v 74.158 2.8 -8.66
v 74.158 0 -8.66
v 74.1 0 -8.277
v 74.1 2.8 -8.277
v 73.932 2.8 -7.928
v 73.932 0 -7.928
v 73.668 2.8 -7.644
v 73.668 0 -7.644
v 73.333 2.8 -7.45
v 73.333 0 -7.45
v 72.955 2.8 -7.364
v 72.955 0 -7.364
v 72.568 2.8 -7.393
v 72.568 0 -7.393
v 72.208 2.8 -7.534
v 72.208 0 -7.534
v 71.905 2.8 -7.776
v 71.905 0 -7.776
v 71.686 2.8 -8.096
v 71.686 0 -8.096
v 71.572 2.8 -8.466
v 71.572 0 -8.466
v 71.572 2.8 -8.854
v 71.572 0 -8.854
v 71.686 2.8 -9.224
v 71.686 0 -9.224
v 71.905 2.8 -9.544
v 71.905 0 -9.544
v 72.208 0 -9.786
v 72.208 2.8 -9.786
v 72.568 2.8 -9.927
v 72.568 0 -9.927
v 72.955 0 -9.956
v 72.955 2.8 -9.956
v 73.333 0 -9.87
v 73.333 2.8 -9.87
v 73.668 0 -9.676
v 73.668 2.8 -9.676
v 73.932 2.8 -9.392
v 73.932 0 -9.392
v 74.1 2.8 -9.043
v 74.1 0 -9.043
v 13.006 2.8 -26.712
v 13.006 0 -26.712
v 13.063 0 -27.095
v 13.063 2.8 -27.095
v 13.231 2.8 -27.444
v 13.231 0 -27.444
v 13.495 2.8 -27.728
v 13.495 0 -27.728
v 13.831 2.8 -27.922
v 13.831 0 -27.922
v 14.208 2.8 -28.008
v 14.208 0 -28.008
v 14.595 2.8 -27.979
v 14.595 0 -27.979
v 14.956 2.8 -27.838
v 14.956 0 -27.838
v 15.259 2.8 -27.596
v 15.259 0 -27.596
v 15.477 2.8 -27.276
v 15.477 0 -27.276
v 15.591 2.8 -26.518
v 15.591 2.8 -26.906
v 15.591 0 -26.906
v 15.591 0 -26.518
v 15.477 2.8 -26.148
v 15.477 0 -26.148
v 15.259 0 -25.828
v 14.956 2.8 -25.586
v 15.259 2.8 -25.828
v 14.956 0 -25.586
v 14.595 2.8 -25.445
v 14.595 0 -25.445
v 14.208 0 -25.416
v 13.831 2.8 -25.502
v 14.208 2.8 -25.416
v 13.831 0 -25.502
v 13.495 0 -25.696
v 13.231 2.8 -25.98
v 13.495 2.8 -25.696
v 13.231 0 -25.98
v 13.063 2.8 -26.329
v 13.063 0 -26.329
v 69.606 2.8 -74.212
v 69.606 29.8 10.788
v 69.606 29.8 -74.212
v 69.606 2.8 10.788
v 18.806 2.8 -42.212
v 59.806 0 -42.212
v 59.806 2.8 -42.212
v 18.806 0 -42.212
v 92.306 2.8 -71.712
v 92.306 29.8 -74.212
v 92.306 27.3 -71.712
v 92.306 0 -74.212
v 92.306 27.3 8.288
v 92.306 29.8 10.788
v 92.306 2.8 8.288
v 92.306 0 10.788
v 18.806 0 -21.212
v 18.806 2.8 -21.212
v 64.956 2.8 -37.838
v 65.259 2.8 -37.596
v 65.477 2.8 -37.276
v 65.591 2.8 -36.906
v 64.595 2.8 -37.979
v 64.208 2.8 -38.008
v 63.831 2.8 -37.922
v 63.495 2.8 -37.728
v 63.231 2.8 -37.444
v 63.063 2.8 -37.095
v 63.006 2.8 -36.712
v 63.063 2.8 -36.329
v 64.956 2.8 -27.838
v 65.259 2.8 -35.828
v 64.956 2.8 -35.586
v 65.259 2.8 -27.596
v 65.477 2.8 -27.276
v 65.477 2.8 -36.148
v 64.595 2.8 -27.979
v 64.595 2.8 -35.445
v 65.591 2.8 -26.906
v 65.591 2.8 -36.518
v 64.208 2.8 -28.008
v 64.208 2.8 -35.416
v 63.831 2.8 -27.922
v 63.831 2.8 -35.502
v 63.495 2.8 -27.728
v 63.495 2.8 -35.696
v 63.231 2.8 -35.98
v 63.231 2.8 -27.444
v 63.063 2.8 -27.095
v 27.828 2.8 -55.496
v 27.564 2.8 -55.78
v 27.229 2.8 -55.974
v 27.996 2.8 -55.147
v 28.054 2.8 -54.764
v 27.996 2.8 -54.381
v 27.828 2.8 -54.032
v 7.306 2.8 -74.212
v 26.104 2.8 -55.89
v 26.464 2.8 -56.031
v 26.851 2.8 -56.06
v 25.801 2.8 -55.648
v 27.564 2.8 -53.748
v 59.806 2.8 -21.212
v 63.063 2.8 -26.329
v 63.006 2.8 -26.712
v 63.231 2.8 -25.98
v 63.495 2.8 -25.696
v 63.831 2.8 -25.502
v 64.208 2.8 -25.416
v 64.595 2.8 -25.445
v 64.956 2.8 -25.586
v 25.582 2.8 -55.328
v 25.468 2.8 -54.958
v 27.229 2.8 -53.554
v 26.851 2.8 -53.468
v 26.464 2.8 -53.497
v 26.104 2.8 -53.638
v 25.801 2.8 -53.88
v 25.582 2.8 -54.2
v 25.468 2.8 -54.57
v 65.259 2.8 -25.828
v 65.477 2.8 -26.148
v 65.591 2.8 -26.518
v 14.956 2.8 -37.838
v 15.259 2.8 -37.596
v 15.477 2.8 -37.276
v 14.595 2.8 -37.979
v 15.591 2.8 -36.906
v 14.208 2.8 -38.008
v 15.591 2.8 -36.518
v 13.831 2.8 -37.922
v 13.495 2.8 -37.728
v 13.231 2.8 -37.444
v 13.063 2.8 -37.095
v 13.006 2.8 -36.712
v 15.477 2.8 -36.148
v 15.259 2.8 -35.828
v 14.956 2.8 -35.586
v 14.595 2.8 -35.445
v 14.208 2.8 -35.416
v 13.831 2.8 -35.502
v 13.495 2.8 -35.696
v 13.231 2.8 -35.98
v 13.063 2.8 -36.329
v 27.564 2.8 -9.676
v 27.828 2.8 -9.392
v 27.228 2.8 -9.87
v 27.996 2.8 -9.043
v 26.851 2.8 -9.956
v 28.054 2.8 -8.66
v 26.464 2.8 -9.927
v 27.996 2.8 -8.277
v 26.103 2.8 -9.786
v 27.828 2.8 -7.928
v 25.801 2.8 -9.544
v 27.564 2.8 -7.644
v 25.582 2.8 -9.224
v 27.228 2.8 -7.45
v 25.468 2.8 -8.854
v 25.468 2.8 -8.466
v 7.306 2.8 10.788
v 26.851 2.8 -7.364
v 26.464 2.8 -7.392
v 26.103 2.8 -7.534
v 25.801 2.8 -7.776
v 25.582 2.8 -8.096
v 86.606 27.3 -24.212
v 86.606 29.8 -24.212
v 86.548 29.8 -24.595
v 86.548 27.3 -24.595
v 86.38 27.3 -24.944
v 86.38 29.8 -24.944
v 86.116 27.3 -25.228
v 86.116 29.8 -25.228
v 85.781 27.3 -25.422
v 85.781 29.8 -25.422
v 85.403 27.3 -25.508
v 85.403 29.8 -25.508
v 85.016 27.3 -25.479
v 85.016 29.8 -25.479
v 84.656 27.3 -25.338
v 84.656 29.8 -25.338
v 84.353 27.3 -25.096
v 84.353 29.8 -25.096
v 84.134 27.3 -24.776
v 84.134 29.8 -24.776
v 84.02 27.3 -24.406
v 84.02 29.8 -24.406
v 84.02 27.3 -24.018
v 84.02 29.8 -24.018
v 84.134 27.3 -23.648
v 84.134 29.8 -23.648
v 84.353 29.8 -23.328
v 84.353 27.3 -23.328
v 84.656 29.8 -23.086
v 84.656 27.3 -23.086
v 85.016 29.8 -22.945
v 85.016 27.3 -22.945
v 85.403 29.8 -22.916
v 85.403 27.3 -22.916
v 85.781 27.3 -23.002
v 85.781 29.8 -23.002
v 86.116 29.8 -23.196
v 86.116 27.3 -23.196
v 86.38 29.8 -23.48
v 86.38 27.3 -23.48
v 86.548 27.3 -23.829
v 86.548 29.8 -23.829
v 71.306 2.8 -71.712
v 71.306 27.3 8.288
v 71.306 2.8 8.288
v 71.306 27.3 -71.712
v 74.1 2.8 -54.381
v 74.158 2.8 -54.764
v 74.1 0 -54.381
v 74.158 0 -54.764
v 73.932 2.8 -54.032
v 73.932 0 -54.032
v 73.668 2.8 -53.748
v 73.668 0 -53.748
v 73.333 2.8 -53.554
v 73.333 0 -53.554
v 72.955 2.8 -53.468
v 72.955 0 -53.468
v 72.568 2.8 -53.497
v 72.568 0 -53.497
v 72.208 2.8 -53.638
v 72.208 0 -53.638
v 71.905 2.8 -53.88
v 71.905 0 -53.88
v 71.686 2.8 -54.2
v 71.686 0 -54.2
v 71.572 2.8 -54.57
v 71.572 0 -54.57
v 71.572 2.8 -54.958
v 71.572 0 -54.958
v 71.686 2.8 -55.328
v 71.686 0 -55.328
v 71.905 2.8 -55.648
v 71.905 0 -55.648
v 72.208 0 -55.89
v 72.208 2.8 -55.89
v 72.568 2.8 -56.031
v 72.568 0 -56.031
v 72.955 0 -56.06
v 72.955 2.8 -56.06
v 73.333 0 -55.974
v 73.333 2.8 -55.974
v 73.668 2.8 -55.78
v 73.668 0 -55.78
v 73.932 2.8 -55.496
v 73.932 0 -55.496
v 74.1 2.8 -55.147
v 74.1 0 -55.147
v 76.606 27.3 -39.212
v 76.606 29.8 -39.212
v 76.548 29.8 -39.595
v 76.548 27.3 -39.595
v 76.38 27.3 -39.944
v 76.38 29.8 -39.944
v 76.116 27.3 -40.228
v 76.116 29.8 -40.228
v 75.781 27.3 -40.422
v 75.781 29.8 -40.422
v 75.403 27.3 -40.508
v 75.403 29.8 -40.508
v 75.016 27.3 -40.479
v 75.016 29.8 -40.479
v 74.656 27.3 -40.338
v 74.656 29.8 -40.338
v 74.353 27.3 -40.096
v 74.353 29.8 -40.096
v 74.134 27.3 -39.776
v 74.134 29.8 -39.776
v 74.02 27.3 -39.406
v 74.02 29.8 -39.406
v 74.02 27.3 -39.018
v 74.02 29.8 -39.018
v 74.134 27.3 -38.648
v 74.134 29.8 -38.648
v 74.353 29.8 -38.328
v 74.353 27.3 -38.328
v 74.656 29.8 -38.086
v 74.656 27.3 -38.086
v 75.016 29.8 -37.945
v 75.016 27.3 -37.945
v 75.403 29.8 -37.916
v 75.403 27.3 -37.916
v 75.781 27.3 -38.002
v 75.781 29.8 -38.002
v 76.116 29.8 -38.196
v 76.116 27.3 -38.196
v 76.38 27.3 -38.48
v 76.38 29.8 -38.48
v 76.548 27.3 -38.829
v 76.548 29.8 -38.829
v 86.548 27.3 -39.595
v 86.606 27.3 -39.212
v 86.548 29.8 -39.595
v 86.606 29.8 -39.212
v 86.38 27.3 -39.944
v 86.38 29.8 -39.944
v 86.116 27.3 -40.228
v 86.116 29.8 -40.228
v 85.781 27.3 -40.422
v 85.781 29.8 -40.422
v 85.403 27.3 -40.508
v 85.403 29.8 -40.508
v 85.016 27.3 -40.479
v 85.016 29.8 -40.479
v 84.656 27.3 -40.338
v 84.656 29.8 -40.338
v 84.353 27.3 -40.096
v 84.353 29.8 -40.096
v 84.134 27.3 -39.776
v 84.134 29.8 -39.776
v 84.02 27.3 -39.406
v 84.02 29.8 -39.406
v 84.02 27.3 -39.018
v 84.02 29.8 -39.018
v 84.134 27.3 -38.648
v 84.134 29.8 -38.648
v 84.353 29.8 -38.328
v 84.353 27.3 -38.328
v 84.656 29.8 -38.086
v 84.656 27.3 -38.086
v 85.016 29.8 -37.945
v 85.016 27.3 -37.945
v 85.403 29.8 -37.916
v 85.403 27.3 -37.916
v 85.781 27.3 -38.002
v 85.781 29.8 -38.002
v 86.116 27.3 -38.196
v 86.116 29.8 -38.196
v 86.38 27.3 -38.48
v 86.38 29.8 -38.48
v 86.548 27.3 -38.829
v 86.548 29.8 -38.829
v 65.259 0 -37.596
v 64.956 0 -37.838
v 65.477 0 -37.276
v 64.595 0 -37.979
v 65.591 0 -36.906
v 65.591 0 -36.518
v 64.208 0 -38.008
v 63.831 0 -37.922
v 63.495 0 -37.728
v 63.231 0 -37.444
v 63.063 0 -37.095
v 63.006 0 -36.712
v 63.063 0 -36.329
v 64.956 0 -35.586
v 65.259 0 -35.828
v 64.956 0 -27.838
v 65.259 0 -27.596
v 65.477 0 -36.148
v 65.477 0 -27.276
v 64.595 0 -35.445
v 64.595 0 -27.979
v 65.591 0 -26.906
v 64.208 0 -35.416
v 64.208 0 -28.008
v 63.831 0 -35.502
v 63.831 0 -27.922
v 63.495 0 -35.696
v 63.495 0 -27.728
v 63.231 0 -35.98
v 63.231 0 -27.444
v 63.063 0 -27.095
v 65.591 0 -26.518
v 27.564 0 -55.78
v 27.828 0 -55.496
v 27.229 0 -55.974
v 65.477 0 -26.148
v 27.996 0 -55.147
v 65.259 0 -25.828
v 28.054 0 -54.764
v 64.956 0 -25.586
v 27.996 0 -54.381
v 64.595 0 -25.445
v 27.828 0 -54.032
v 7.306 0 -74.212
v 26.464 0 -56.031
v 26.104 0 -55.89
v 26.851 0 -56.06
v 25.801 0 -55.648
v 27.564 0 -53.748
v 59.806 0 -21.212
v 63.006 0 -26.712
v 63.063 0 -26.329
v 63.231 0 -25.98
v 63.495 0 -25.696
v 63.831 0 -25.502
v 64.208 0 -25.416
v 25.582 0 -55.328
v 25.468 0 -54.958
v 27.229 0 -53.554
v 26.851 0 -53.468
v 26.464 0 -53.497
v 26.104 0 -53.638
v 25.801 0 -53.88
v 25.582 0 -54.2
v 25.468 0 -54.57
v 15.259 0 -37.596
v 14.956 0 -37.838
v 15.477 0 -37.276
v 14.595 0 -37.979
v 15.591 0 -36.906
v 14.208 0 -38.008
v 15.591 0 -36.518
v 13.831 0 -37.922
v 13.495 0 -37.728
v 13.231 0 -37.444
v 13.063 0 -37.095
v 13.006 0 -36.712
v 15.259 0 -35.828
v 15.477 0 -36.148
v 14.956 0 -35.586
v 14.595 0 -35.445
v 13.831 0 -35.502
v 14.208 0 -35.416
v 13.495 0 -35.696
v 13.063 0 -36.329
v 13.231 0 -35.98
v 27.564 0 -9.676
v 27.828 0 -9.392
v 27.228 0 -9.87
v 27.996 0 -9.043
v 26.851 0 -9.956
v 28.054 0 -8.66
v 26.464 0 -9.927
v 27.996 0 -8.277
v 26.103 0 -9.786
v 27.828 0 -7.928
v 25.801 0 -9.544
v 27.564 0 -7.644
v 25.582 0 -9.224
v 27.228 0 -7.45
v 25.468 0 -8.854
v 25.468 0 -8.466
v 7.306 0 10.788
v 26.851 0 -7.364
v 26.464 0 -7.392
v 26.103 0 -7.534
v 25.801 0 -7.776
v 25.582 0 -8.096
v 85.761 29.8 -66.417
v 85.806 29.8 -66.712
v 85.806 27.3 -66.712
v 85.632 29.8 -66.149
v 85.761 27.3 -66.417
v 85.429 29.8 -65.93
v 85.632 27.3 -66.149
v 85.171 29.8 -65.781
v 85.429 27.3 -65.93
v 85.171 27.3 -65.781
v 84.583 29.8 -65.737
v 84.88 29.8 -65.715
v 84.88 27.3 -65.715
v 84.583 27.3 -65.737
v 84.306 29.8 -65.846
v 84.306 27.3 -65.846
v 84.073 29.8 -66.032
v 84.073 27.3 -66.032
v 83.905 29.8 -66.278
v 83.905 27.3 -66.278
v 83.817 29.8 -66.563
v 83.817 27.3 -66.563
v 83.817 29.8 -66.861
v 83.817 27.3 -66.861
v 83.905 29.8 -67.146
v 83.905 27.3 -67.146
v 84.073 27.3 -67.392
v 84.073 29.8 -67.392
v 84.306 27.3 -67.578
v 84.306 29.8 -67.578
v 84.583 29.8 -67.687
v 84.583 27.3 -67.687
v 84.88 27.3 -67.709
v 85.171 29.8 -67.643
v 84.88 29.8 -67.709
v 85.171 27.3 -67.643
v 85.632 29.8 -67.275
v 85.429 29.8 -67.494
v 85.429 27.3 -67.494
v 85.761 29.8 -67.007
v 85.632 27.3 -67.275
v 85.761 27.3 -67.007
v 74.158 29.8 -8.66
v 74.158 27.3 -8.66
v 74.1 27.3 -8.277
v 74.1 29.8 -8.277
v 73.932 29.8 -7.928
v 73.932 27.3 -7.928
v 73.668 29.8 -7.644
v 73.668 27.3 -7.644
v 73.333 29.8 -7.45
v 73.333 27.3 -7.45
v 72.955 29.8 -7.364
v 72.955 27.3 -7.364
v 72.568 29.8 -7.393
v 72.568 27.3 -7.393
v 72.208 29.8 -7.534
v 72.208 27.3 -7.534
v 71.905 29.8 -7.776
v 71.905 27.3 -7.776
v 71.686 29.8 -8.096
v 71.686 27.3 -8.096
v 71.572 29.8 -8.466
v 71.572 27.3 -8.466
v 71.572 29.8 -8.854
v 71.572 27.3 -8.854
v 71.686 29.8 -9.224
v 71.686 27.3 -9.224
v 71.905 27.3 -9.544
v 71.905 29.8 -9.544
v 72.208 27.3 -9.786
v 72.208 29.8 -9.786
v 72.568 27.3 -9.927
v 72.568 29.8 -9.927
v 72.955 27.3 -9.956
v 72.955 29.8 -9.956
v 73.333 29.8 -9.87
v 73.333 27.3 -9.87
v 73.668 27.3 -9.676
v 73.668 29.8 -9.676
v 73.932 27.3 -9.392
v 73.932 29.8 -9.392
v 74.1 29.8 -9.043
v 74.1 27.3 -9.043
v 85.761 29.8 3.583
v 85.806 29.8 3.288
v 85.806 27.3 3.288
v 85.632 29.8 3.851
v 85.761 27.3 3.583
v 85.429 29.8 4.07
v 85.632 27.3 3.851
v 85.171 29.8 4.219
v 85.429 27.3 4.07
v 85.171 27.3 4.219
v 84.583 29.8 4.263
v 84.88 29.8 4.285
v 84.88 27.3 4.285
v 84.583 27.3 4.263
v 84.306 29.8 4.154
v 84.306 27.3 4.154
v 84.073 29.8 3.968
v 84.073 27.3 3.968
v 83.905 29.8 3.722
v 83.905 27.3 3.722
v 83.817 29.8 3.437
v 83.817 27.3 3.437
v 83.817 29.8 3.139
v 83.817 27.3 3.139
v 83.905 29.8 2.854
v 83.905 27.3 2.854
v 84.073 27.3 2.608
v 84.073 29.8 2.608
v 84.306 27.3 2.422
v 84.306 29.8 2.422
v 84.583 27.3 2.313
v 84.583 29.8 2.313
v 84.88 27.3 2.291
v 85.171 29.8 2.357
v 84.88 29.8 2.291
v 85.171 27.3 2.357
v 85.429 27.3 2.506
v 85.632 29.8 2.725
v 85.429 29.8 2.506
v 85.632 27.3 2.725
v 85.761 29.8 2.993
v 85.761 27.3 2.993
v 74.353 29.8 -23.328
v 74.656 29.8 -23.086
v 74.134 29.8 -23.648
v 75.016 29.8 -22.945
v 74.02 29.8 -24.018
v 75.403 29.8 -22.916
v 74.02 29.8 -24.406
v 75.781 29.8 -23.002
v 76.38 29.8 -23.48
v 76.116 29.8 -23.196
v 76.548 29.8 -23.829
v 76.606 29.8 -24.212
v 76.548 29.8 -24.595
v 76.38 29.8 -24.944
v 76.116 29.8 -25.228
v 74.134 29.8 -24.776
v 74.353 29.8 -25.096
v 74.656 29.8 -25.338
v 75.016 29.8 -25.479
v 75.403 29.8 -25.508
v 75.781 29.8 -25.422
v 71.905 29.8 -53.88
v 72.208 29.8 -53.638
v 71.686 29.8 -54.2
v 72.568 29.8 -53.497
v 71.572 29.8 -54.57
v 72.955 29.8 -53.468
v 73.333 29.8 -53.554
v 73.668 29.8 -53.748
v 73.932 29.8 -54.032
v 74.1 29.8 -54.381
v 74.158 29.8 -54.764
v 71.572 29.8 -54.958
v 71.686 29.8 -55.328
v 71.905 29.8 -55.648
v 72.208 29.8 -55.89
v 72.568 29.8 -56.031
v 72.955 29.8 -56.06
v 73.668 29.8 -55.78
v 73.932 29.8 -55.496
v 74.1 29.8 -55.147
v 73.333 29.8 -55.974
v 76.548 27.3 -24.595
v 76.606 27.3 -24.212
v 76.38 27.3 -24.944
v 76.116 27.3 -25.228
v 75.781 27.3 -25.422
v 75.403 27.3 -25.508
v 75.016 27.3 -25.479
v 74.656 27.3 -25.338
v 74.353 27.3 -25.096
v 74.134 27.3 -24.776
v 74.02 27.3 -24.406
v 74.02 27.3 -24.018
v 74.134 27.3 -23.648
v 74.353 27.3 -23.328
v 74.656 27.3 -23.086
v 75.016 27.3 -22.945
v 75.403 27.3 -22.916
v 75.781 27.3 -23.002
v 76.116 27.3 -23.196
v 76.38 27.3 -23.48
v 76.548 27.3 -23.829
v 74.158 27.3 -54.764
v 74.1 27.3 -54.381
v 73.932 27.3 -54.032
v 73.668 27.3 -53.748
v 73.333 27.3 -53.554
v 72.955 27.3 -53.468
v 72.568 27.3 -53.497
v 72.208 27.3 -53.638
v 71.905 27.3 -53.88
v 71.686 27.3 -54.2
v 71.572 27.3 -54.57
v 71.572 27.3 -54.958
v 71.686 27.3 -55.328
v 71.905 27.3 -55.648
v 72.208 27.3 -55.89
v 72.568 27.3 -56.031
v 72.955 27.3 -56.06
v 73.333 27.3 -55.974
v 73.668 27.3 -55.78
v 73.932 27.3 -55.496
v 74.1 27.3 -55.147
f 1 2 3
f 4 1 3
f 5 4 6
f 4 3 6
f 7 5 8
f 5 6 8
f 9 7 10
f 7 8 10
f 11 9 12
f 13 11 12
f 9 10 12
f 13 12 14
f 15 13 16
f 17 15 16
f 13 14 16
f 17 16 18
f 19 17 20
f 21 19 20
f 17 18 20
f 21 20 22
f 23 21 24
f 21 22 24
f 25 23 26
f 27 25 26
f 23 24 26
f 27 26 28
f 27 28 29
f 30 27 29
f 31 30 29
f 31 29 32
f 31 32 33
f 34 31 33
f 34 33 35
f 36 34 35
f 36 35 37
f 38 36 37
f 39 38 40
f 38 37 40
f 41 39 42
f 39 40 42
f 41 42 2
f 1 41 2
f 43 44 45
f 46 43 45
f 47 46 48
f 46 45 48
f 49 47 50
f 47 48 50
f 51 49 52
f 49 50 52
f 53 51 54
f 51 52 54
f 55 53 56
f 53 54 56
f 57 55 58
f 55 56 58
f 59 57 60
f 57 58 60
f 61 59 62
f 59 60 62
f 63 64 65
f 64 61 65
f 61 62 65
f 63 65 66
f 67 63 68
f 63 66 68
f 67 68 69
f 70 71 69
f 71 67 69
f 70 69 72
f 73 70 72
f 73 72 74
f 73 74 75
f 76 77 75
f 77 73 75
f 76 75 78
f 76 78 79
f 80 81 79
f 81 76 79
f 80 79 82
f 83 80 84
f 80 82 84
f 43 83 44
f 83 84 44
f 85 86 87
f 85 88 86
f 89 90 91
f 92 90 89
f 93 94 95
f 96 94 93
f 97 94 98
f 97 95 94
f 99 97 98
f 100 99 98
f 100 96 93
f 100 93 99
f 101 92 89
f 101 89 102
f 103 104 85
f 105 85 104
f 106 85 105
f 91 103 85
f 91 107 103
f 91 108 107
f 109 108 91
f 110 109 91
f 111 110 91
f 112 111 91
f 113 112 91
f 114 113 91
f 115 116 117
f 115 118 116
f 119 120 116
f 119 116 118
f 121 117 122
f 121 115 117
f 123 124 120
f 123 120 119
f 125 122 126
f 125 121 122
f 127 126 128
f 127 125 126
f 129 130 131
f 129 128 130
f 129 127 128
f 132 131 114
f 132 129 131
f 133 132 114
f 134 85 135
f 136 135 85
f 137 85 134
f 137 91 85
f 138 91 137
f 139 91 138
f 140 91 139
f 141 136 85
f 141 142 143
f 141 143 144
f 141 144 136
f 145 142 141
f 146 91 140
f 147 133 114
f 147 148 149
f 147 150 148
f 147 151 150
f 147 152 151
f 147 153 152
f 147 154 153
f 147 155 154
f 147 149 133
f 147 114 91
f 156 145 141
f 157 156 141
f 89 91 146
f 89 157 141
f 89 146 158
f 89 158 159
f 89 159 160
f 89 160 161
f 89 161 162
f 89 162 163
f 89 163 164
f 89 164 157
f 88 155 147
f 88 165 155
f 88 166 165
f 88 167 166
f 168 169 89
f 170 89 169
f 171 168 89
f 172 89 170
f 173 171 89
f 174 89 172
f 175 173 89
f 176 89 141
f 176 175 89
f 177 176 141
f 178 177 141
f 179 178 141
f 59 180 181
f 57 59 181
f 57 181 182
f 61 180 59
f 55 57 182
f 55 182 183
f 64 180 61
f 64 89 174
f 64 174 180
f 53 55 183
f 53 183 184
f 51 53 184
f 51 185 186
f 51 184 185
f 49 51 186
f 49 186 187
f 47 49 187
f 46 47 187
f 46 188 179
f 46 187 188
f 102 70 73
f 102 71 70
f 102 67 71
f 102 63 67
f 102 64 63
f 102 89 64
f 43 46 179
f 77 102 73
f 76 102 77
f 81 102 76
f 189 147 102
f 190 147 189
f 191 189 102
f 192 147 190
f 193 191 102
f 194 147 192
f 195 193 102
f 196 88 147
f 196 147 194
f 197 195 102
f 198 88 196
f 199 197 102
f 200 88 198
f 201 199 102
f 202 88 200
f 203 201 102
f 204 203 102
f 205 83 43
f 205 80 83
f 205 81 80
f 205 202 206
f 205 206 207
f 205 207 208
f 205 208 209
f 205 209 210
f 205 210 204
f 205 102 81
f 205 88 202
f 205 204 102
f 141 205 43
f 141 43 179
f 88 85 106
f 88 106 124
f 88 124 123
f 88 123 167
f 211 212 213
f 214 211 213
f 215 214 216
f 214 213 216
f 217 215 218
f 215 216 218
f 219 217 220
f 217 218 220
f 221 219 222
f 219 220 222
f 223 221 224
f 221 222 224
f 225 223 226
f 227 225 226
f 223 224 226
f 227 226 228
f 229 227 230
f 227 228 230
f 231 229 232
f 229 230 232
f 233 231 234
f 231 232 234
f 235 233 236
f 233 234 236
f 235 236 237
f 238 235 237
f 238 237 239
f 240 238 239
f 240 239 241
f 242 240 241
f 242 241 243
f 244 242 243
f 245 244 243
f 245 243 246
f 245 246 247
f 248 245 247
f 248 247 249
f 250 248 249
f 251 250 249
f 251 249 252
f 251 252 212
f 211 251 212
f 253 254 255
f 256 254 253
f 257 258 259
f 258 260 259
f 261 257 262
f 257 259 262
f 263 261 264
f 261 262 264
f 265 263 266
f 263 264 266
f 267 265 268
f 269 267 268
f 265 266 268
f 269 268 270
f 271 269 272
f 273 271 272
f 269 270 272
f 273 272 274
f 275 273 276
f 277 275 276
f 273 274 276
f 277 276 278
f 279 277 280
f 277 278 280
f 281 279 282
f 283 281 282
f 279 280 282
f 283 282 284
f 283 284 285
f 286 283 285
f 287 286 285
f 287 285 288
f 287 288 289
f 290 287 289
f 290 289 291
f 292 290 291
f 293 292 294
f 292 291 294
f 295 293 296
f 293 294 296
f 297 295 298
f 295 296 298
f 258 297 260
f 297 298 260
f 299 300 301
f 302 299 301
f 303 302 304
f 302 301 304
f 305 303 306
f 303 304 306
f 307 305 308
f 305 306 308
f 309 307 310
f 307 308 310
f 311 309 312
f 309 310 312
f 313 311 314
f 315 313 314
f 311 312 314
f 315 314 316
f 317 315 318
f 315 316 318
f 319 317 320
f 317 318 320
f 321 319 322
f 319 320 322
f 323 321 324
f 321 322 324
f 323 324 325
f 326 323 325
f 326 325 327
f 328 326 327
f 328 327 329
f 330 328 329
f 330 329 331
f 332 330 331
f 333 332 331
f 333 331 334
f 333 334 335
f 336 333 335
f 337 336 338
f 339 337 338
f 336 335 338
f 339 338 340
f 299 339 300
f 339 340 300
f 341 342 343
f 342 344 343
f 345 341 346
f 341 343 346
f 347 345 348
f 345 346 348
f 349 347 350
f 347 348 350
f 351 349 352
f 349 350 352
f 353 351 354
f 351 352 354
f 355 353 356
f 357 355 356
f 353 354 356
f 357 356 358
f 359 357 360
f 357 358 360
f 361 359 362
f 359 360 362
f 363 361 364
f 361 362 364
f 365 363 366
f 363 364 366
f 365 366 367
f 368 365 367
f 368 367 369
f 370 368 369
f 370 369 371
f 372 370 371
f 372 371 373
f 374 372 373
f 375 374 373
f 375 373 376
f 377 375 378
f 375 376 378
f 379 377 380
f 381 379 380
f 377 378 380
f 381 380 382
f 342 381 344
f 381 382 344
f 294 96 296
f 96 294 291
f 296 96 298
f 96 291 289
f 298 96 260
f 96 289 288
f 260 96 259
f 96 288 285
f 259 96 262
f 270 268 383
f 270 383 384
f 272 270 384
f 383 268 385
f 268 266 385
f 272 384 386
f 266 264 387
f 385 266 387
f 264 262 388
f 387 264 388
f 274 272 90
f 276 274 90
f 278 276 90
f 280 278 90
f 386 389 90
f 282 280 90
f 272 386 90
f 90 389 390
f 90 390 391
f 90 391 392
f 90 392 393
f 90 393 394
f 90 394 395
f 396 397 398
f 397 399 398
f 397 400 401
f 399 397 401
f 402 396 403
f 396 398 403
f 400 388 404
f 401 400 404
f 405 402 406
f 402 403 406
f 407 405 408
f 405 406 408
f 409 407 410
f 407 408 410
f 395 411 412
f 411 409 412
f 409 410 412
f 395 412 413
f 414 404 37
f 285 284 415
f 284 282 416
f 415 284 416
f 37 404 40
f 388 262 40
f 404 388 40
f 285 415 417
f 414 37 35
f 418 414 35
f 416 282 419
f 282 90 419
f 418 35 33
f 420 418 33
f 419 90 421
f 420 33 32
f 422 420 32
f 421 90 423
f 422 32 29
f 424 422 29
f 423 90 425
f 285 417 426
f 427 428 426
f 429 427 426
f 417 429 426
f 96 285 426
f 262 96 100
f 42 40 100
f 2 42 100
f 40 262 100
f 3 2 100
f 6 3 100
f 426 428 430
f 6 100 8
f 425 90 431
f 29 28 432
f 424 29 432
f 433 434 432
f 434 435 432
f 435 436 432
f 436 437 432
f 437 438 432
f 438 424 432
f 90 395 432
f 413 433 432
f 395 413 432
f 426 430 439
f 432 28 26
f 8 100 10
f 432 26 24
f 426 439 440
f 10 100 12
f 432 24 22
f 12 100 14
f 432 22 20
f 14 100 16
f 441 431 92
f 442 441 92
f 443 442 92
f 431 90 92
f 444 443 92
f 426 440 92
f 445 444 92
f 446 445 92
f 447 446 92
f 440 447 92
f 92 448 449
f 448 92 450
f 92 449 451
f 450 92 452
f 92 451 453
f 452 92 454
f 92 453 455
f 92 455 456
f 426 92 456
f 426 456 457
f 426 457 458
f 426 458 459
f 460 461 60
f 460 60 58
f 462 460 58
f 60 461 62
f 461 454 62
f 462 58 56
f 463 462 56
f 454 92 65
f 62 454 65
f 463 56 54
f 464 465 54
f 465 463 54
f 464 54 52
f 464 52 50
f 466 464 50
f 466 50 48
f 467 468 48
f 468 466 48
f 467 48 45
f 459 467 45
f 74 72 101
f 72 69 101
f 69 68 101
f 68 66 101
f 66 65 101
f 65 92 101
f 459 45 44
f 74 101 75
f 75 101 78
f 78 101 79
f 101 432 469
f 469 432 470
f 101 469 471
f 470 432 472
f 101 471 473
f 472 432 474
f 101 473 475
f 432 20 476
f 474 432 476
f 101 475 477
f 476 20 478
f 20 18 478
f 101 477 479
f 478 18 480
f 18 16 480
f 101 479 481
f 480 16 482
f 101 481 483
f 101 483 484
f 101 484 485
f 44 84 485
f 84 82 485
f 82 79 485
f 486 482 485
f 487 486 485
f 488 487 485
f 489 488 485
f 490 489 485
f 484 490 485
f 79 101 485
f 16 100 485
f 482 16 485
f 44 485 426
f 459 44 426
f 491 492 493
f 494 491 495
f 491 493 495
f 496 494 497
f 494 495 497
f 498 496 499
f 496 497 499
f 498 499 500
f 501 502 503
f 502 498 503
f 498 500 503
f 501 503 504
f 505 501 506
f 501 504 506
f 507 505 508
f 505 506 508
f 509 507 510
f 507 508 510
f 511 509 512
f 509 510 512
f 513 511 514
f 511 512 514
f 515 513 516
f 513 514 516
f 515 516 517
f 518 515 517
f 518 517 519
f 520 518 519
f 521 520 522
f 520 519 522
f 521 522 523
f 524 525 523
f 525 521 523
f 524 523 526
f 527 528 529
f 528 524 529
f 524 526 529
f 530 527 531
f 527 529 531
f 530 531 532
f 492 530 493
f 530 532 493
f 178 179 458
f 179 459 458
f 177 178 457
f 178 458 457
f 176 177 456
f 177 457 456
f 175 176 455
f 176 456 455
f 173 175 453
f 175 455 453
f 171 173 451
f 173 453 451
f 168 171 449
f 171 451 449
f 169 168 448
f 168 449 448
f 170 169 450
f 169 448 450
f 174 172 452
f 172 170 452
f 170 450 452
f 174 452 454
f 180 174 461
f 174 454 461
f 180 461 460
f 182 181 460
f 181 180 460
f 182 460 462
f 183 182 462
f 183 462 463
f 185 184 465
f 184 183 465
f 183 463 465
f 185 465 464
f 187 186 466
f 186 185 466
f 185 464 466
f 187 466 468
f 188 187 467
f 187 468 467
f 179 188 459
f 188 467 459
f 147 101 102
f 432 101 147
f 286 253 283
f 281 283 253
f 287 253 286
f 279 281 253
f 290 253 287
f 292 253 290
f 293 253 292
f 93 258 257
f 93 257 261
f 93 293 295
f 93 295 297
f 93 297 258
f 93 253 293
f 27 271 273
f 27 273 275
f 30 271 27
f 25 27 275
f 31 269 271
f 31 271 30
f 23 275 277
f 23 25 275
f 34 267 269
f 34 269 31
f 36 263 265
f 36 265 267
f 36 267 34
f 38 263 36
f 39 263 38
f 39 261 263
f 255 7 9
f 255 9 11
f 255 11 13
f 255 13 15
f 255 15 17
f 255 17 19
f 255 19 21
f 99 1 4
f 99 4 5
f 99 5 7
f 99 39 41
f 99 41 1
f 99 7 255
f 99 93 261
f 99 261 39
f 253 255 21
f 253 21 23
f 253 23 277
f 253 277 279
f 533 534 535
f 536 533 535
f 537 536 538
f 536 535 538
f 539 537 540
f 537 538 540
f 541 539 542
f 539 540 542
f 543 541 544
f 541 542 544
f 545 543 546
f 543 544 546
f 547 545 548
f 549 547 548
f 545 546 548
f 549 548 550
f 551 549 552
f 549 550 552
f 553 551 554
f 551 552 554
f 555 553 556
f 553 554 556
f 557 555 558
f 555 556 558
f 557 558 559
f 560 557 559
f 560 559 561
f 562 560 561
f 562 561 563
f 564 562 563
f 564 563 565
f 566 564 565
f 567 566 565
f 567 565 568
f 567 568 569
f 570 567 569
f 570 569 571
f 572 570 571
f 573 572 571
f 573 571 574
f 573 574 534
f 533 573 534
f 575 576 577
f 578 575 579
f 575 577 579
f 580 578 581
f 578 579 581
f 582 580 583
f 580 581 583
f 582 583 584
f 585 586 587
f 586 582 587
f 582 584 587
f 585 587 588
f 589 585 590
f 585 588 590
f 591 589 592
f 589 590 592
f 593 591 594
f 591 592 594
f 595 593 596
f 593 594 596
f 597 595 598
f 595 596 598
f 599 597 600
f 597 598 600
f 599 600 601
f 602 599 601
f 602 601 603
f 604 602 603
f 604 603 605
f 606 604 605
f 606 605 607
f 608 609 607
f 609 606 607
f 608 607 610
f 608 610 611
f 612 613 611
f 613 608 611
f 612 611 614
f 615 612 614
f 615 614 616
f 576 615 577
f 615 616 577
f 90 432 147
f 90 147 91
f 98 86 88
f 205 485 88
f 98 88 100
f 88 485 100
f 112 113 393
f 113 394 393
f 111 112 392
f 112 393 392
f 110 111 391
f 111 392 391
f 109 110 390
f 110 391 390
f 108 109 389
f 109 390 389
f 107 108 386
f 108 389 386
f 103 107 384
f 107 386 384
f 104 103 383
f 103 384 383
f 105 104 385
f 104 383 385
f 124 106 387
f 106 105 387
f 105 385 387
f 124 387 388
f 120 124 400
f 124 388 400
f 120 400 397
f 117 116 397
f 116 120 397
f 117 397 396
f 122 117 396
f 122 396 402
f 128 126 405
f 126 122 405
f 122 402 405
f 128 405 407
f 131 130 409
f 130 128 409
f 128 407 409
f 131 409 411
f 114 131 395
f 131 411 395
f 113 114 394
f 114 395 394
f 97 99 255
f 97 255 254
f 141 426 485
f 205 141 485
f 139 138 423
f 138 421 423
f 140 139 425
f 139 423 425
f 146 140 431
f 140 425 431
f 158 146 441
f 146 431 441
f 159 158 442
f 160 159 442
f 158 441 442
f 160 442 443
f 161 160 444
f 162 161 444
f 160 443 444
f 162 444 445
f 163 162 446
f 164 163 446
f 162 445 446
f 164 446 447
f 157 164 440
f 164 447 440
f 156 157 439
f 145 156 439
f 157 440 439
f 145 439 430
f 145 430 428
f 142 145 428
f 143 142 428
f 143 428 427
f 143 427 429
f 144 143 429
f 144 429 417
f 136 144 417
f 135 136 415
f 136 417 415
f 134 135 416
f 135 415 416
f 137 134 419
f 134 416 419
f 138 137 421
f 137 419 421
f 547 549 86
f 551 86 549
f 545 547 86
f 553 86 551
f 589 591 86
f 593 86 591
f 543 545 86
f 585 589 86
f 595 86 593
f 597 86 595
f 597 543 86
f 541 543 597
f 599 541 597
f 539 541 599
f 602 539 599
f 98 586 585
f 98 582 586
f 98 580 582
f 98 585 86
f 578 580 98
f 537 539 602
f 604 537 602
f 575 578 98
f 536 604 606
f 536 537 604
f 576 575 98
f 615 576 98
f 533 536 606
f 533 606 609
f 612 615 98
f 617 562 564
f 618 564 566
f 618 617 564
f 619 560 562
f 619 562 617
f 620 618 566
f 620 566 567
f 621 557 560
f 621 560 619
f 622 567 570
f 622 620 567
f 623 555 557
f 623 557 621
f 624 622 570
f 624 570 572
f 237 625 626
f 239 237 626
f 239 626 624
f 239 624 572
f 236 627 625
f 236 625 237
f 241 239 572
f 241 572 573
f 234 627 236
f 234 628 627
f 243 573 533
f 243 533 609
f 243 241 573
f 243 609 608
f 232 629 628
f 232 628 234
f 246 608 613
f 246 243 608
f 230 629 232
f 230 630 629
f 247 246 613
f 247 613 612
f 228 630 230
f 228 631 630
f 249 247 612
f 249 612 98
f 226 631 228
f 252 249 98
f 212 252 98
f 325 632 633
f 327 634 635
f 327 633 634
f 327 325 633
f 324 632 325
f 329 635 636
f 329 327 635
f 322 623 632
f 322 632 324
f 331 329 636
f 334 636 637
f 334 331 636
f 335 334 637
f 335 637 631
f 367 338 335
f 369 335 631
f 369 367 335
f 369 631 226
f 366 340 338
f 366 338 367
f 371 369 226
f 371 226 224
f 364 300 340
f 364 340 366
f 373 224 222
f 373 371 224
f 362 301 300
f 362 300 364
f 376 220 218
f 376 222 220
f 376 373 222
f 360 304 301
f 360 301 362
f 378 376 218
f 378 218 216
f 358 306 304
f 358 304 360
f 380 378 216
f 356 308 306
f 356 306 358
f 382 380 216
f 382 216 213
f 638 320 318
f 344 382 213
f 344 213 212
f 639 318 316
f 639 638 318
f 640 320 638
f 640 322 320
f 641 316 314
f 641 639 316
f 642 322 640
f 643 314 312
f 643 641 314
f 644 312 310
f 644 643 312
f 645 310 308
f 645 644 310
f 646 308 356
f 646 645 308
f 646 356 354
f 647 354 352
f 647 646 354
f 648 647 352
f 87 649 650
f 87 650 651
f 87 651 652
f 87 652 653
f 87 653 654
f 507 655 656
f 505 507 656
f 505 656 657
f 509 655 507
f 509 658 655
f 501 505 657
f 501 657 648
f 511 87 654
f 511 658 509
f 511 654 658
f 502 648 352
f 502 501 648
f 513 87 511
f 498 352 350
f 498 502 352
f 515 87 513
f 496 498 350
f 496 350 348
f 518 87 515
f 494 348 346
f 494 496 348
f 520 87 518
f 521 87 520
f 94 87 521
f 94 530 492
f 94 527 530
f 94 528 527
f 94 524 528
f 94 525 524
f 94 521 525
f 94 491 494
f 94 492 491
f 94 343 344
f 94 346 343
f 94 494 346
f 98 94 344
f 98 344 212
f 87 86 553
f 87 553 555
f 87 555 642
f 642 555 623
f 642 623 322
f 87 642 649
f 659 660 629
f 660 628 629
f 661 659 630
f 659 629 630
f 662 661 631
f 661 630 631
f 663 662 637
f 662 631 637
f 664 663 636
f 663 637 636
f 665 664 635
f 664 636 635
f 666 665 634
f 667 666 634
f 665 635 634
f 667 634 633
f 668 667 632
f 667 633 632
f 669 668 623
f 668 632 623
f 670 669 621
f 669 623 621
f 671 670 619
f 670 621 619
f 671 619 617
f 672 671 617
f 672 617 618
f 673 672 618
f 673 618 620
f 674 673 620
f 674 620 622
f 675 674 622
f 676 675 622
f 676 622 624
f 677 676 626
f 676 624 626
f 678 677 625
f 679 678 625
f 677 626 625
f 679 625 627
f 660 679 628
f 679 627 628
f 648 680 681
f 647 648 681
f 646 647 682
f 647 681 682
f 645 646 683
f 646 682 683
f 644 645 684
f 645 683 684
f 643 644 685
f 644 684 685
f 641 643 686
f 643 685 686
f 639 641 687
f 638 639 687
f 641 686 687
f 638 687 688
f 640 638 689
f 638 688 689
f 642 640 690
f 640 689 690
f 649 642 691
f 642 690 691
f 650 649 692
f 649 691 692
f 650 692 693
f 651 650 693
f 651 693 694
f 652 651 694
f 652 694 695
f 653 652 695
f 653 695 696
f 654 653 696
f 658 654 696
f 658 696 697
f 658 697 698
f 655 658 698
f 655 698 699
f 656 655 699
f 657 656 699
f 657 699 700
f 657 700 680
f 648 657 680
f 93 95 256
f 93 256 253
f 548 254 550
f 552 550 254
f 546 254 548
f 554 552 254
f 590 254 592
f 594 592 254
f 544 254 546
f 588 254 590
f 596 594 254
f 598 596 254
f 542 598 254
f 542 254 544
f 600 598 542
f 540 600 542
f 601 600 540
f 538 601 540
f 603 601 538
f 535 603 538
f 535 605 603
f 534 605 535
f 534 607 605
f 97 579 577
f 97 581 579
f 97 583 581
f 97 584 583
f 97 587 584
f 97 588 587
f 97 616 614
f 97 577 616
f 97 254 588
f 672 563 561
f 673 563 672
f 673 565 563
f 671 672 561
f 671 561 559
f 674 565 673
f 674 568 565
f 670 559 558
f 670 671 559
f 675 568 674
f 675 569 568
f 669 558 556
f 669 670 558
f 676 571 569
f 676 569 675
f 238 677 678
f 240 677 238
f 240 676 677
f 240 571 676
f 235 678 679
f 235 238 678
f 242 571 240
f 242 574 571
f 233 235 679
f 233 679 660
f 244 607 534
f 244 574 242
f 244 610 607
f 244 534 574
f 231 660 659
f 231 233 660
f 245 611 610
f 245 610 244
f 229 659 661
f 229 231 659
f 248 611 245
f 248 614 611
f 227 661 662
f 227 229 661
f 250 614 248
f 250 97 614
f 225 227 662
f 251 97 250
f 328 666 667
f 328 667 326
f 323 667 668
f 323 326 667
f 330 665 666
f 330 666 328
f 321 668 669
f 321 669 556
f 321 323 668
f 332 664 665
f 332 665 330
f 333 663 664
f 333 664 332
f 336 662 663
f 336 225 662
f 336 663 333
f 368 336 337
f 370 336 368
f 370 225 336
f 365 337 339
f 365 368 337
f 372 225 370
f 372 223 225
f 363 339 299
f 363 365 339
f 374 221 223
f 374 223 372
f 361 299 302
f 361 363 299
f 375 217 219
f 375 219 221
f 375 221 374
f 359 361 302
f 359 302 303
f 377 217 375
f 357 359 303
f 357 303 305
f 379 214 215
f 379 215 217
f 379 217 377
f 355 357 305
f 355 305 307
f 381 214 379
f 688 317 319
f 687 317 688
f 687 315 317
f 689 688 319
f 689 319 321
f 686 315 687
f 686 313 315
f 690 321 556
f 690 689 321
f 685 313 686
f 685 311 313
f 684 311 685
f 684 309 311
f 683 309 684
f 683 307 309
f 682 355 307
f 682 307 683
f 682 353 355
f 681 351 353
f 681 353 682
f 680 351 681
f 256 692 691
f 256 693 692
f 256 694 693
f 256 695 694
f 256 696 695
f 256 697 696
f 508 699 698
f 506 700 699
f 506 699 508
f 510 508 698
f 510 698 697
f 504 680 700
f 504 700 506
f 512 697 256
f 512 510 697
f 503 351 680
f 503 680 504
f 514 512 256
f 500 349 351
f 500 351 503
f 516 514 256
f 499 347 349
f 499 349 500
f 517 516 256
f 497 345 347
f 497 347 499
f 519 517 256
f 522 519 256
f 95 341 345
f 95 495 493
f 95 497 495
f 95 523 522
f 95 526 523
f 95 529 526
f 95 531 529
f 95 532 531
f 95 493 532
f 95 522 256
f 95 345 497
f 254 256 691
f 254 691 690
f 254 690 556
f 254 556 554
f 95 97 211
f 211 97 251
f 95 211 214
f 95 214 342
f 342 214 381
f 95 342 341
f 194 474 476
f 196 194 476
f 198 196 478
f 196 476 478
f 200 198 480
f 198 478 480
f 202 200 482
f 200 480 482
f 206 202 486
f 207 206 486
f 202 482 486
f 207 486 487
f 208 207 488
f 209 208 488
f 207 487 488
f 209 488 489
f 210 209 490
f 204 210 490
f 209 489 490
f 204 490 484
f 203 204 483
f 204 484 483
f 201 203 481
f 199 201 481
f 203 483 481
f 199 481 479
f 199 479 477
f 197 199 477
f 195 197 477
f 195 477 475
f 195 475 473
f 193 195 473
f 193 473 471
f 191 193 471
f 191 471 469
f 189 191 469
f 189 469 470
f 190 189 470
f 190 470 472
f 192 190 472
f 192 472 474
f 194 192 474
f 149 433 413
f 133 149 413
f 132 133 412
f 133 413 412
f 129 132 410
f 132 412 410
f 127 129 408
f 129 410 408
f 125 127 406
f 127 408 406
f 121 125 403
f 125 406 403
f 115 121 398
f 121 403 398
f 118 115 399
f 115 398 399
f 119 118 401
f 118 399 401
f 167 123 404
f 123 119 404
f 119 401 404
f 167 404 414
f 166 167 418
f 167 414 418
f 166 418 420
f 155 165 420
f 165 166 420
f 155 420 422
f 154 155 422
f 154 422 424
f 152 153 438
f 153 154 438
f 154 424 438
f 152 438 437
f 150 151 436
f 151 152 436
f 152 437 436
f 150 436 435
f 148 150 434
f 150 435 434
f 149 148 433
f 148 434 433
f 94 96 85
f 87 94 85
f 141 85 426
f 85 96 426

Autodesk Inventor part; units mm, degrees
ref_plane "YZ Plane" through (0, 0, 0) normal (1, 0, 0) x (0, 1, 0)
ref_plane "XZ Plane" through (0, 0, 0) normal (0, 1, 0) x (-1, 0, 0)
ref_plane "XY Plane" through (0, 0, 0) normal (0, 0, 1) x (1, 0, 0)
sketch "Sketch1" plane through (0, 0, 0) normal (0, 1, 0) x (-1, 0, 0)
  line L0 (-7.3056, 10.788) -> (-92.3056, 10.788)
  line L1 (-92.3056, 10.788) -> (-92.3056, -74.212)
  line L2 (-92.3056, -74.212) -> (-7.3056, -74.212)
  line L3 (-7.3056, -74.212) -> (-7.3056, 10.788)
  line L4 (-18.8056, -21.212) -> (-59.8056, -21.212)
  line L5 (-59.8056, -21.212) -> (-59.8056, -42.212)
  line L6 (-59.8056, -42.212) -> (-18.8056, -42.212)
  line L7 (-18.8056, -42.212) -> (-18.8056, -21.212)
  circle A0 centre (-14.3056, -26.712) radius 1.3
  circle A1 centre (-14.3056, -36.712) radius 1.3
  circle A2 centre (-64.3056, -26.712) radius 1.3
  circle A3 centre (-64.3056, -36.712) radius 1.3
  circle A4 centre (-75.3056, -39.212) radius 1.3
  circle A5 centre (-85.3056, -39.212) radius 1.3
  circle A6 centre (-75.3056, -24.212) radius 1.3
  circle A7 centre (-85.3052, -24.1286) radius 1.3
  point P0 (0, 0)
  dimension "d0" = 85
  dimension "d1" = 85
  dimension "d2" = 41
  dimension "d3" = 21
  dimension "d4" = 32
  dimension "d5" = 11.5
  dimension "d6" = 2.6
  dimension "d7" = 2.6
  dimension "d8" = 10
  dimension "d9" = 5.5
  dimension "d10" = 5.5
  dimension "d11" = 2.6
  dimension "d12" = 2.6
  dimension "d13" = 10
  dimension "d14" = 5.5
  dimension "d15" = 50
  dimension "d16" = 50
  dimension "d17" = 4.5
  dimension "d31" = 2.6
  dimension "d32" = 2.6
  dimension "d33" = 10
  dimension "d34" = 2.6
  dimension "d35" = 2.6
  dimension "d36" = 10
  dimension "d37" = 15
  dimension "d38" = 35
  dimension "d39" = 17
  dimension "d40" = 17
extrude "Extrusion1" add sketch "Sketch1" along normal blind 2.8 contours L3 L2 L1 L0 | A4 | A5 | A6 | A7
sketch "Sketch2" plane through (0, 2.8, 0) normal (0, 1, 0) x (1, 0, 0)
  line L0 (92.3056, -10.788) -> (92.3056, 74.212) projected
  line L1 (92.3056, 74.212) -> (7.3056, 74.212) projected
  line L2 (7.3056, -10.788) -> (92.3056, -10.788) projected
  point P0 (0, 0)
extrude "Extrusion2" [suppressed]
sketch "Sketch3" plane through (0, 2.8, 0) normal (0, 1, 0) x (1, 0, 0)
  line L0 (7.3056, -10.788) -> (92.3056, -10.788) projected
  line L1 (92.3056, 74.212) -> (7.3056, 74.212) projected
  line L2 (92.3056, -10.788) -> (69.6056, -10.788)
  line L3 (69.6056, -10.788) -> (69.6056, 74.212)
  line L4 (69.6056, 74.212) -> (92.3056, 74.212)
  line L5 (92.3056, 74.212) -> (92.3056, -10.788)
  circle A0 centre (64.3056, 36.712) radius 1.3 projected
  circle A1 centre (75.3056, 24.212) radius 1 projected
  circle A2 centre (75.3056, 24.212) radius 1
  circle A3 centre (75.3056, 39.212) radius 1 projected
  circle A4 centre (75.3056, 39.212) radius 1
  circle A5 centre (85.3056, 39.212) radius 1 projected
  circle A6 centre (85.3056, 39.212) radius 1
  circle A7 centre (85.3056, 24.212) radius 1 projected
  circle A8 centre (85.3056, 24.212) radius 1
  circle A9 centre (84.8056, 66.712) radius 0.95 projected
  circle A10 centre (84.8056, 66.712) radius 1
  circle A11 centre (84.8056, -3.288) radius 0.95 projected
  circle A12 centre (84.8056, -3.288) radius 1
  point P0 (0, 0)
  dimension "d55" = 4
  dimension "d56" = 2
  dimension "d57" = 2
extrude "Extrusion3" add sketch "Sketch3" along normal blind 27 contours L3 L1 L5 L0
sketch "Sketch4" plane through (92.3056, 0, 10.788) normal (1, 0, 0) x (0, 0, -1)
  line L0 (85, 2.8) -> (0, 2.8) projected
  line L1 (2.5, 27.3) -> (82.5, 27.3)
  line L2 (82.5, 27.3) -> (82.5, 2.8)
  line L3 (82.5, 2.8) -> (2.5, 2.8)
  line L4 (2.5, 2.8) -> (2.5, 27.3)
  line L5 (0, 0) -> (0, 29.8) projected
  line L6 (85, 0) -> (85, 29.8) projected
  line L7 (0, 0) -> (85, 0) projected
  line L8 (0, 29.8) -> (85, 29.8) projected
  point P0 (10.788, 0)
  point P1 (2.5, 2.8)
  dimension "d60" = 2.5
  dimension "d61" = 2.5
  dimension "d62" = 2.8
  dimension "d63" = 2.5
extrude "Extrusion4" cut sketch "Sketch4" against normal blind 21 contours L0 L4 L1 L2
sketch "Sketch5" plane through (0, 0, 0) normal (0, -1, 0) x (1, 0, 0)
  circle A0 centre (26.7535, -8.6599) radius 1.3
  circle A1 centre (72.8576, -8.66) radius 1.3
  circle A2 centre (26.7536, -54.764) radius 1.3
  circle A3 centre (72.8576, -54.764) radius 1.3
  line L0 (7.3056, 10.788) -> (92.3056, 10.788) projected
  line L1 (92.3056, 10.788) -> (92.3056, -74.212) projected
  line L2 (7.3056, -74.212) -> (7.3056, 10.788) projected
  line L3 (92.3056, -74.212) -> (7.3056, -74.212) projected
  point P0 (0, 0)
  point P1 (49.2547, -32.4518)
  point P2 (49.2547, -32.4518)
  dimension "d66" = 2.6
  dimension "d67" = 2.6
  dimension "d68" = 2.6
  dimension "d69" = 2.6
  dimension "d70" = 46.1041
  dimension "d71" = 46.1041
  dimension "d72" = 46.1041
  dimension "d73" = 46.1041
  dimension "d74" = 19.448
  dimension "d75" = 19.448
  dimension "d76" = 19.448
  dimension "d77" = 19.448
extrude "Extrusion5" cut sketch "Sketch5" against normal blind 100 contours A0 | A1 | A2 | A3
sketch "Sketch6" plane through (0, 29.8, 0) normal (0, 1, 0) x (1, 0, 0)
  point P0 (0, 0)
sketch "Sketch7" plane through (0, 29.8, 0) normal (0, 1, 0) x (1, 0, 0)
  circle A0 centre (75.3056, 39.212) radius 1 projected
  circle A1 centre (75.3056, 39.212) radius 1.3
  circle A2 centre (85.3056, 39.212) radius 1 projected
  circle A3 centre (85.3056, 39.212) radius 1.3
  circle A4 centre (75.3056, 24.212) radius 1 projected
  circle A5 centre (75.3056, 24.212) radius 1.3
  circle A6 centre (85.3056, 24.212) radius 1 projected
  circle A7 centre (85.3056, 24.212) radius 1.3
  point P0 (0, 0)
  dimension "d80" = 2.6
  dimension "d81" = 2.6
  dimension "d82" = 2.6
  dimension "d83" = 2.6
extrude "Extrusion6" cut sketch "Sketch7" against normal blind 10 contours A0 | A1 | A2 | A3 | A4 | A5 | A6 | A7
properties part number "LowerHead"
